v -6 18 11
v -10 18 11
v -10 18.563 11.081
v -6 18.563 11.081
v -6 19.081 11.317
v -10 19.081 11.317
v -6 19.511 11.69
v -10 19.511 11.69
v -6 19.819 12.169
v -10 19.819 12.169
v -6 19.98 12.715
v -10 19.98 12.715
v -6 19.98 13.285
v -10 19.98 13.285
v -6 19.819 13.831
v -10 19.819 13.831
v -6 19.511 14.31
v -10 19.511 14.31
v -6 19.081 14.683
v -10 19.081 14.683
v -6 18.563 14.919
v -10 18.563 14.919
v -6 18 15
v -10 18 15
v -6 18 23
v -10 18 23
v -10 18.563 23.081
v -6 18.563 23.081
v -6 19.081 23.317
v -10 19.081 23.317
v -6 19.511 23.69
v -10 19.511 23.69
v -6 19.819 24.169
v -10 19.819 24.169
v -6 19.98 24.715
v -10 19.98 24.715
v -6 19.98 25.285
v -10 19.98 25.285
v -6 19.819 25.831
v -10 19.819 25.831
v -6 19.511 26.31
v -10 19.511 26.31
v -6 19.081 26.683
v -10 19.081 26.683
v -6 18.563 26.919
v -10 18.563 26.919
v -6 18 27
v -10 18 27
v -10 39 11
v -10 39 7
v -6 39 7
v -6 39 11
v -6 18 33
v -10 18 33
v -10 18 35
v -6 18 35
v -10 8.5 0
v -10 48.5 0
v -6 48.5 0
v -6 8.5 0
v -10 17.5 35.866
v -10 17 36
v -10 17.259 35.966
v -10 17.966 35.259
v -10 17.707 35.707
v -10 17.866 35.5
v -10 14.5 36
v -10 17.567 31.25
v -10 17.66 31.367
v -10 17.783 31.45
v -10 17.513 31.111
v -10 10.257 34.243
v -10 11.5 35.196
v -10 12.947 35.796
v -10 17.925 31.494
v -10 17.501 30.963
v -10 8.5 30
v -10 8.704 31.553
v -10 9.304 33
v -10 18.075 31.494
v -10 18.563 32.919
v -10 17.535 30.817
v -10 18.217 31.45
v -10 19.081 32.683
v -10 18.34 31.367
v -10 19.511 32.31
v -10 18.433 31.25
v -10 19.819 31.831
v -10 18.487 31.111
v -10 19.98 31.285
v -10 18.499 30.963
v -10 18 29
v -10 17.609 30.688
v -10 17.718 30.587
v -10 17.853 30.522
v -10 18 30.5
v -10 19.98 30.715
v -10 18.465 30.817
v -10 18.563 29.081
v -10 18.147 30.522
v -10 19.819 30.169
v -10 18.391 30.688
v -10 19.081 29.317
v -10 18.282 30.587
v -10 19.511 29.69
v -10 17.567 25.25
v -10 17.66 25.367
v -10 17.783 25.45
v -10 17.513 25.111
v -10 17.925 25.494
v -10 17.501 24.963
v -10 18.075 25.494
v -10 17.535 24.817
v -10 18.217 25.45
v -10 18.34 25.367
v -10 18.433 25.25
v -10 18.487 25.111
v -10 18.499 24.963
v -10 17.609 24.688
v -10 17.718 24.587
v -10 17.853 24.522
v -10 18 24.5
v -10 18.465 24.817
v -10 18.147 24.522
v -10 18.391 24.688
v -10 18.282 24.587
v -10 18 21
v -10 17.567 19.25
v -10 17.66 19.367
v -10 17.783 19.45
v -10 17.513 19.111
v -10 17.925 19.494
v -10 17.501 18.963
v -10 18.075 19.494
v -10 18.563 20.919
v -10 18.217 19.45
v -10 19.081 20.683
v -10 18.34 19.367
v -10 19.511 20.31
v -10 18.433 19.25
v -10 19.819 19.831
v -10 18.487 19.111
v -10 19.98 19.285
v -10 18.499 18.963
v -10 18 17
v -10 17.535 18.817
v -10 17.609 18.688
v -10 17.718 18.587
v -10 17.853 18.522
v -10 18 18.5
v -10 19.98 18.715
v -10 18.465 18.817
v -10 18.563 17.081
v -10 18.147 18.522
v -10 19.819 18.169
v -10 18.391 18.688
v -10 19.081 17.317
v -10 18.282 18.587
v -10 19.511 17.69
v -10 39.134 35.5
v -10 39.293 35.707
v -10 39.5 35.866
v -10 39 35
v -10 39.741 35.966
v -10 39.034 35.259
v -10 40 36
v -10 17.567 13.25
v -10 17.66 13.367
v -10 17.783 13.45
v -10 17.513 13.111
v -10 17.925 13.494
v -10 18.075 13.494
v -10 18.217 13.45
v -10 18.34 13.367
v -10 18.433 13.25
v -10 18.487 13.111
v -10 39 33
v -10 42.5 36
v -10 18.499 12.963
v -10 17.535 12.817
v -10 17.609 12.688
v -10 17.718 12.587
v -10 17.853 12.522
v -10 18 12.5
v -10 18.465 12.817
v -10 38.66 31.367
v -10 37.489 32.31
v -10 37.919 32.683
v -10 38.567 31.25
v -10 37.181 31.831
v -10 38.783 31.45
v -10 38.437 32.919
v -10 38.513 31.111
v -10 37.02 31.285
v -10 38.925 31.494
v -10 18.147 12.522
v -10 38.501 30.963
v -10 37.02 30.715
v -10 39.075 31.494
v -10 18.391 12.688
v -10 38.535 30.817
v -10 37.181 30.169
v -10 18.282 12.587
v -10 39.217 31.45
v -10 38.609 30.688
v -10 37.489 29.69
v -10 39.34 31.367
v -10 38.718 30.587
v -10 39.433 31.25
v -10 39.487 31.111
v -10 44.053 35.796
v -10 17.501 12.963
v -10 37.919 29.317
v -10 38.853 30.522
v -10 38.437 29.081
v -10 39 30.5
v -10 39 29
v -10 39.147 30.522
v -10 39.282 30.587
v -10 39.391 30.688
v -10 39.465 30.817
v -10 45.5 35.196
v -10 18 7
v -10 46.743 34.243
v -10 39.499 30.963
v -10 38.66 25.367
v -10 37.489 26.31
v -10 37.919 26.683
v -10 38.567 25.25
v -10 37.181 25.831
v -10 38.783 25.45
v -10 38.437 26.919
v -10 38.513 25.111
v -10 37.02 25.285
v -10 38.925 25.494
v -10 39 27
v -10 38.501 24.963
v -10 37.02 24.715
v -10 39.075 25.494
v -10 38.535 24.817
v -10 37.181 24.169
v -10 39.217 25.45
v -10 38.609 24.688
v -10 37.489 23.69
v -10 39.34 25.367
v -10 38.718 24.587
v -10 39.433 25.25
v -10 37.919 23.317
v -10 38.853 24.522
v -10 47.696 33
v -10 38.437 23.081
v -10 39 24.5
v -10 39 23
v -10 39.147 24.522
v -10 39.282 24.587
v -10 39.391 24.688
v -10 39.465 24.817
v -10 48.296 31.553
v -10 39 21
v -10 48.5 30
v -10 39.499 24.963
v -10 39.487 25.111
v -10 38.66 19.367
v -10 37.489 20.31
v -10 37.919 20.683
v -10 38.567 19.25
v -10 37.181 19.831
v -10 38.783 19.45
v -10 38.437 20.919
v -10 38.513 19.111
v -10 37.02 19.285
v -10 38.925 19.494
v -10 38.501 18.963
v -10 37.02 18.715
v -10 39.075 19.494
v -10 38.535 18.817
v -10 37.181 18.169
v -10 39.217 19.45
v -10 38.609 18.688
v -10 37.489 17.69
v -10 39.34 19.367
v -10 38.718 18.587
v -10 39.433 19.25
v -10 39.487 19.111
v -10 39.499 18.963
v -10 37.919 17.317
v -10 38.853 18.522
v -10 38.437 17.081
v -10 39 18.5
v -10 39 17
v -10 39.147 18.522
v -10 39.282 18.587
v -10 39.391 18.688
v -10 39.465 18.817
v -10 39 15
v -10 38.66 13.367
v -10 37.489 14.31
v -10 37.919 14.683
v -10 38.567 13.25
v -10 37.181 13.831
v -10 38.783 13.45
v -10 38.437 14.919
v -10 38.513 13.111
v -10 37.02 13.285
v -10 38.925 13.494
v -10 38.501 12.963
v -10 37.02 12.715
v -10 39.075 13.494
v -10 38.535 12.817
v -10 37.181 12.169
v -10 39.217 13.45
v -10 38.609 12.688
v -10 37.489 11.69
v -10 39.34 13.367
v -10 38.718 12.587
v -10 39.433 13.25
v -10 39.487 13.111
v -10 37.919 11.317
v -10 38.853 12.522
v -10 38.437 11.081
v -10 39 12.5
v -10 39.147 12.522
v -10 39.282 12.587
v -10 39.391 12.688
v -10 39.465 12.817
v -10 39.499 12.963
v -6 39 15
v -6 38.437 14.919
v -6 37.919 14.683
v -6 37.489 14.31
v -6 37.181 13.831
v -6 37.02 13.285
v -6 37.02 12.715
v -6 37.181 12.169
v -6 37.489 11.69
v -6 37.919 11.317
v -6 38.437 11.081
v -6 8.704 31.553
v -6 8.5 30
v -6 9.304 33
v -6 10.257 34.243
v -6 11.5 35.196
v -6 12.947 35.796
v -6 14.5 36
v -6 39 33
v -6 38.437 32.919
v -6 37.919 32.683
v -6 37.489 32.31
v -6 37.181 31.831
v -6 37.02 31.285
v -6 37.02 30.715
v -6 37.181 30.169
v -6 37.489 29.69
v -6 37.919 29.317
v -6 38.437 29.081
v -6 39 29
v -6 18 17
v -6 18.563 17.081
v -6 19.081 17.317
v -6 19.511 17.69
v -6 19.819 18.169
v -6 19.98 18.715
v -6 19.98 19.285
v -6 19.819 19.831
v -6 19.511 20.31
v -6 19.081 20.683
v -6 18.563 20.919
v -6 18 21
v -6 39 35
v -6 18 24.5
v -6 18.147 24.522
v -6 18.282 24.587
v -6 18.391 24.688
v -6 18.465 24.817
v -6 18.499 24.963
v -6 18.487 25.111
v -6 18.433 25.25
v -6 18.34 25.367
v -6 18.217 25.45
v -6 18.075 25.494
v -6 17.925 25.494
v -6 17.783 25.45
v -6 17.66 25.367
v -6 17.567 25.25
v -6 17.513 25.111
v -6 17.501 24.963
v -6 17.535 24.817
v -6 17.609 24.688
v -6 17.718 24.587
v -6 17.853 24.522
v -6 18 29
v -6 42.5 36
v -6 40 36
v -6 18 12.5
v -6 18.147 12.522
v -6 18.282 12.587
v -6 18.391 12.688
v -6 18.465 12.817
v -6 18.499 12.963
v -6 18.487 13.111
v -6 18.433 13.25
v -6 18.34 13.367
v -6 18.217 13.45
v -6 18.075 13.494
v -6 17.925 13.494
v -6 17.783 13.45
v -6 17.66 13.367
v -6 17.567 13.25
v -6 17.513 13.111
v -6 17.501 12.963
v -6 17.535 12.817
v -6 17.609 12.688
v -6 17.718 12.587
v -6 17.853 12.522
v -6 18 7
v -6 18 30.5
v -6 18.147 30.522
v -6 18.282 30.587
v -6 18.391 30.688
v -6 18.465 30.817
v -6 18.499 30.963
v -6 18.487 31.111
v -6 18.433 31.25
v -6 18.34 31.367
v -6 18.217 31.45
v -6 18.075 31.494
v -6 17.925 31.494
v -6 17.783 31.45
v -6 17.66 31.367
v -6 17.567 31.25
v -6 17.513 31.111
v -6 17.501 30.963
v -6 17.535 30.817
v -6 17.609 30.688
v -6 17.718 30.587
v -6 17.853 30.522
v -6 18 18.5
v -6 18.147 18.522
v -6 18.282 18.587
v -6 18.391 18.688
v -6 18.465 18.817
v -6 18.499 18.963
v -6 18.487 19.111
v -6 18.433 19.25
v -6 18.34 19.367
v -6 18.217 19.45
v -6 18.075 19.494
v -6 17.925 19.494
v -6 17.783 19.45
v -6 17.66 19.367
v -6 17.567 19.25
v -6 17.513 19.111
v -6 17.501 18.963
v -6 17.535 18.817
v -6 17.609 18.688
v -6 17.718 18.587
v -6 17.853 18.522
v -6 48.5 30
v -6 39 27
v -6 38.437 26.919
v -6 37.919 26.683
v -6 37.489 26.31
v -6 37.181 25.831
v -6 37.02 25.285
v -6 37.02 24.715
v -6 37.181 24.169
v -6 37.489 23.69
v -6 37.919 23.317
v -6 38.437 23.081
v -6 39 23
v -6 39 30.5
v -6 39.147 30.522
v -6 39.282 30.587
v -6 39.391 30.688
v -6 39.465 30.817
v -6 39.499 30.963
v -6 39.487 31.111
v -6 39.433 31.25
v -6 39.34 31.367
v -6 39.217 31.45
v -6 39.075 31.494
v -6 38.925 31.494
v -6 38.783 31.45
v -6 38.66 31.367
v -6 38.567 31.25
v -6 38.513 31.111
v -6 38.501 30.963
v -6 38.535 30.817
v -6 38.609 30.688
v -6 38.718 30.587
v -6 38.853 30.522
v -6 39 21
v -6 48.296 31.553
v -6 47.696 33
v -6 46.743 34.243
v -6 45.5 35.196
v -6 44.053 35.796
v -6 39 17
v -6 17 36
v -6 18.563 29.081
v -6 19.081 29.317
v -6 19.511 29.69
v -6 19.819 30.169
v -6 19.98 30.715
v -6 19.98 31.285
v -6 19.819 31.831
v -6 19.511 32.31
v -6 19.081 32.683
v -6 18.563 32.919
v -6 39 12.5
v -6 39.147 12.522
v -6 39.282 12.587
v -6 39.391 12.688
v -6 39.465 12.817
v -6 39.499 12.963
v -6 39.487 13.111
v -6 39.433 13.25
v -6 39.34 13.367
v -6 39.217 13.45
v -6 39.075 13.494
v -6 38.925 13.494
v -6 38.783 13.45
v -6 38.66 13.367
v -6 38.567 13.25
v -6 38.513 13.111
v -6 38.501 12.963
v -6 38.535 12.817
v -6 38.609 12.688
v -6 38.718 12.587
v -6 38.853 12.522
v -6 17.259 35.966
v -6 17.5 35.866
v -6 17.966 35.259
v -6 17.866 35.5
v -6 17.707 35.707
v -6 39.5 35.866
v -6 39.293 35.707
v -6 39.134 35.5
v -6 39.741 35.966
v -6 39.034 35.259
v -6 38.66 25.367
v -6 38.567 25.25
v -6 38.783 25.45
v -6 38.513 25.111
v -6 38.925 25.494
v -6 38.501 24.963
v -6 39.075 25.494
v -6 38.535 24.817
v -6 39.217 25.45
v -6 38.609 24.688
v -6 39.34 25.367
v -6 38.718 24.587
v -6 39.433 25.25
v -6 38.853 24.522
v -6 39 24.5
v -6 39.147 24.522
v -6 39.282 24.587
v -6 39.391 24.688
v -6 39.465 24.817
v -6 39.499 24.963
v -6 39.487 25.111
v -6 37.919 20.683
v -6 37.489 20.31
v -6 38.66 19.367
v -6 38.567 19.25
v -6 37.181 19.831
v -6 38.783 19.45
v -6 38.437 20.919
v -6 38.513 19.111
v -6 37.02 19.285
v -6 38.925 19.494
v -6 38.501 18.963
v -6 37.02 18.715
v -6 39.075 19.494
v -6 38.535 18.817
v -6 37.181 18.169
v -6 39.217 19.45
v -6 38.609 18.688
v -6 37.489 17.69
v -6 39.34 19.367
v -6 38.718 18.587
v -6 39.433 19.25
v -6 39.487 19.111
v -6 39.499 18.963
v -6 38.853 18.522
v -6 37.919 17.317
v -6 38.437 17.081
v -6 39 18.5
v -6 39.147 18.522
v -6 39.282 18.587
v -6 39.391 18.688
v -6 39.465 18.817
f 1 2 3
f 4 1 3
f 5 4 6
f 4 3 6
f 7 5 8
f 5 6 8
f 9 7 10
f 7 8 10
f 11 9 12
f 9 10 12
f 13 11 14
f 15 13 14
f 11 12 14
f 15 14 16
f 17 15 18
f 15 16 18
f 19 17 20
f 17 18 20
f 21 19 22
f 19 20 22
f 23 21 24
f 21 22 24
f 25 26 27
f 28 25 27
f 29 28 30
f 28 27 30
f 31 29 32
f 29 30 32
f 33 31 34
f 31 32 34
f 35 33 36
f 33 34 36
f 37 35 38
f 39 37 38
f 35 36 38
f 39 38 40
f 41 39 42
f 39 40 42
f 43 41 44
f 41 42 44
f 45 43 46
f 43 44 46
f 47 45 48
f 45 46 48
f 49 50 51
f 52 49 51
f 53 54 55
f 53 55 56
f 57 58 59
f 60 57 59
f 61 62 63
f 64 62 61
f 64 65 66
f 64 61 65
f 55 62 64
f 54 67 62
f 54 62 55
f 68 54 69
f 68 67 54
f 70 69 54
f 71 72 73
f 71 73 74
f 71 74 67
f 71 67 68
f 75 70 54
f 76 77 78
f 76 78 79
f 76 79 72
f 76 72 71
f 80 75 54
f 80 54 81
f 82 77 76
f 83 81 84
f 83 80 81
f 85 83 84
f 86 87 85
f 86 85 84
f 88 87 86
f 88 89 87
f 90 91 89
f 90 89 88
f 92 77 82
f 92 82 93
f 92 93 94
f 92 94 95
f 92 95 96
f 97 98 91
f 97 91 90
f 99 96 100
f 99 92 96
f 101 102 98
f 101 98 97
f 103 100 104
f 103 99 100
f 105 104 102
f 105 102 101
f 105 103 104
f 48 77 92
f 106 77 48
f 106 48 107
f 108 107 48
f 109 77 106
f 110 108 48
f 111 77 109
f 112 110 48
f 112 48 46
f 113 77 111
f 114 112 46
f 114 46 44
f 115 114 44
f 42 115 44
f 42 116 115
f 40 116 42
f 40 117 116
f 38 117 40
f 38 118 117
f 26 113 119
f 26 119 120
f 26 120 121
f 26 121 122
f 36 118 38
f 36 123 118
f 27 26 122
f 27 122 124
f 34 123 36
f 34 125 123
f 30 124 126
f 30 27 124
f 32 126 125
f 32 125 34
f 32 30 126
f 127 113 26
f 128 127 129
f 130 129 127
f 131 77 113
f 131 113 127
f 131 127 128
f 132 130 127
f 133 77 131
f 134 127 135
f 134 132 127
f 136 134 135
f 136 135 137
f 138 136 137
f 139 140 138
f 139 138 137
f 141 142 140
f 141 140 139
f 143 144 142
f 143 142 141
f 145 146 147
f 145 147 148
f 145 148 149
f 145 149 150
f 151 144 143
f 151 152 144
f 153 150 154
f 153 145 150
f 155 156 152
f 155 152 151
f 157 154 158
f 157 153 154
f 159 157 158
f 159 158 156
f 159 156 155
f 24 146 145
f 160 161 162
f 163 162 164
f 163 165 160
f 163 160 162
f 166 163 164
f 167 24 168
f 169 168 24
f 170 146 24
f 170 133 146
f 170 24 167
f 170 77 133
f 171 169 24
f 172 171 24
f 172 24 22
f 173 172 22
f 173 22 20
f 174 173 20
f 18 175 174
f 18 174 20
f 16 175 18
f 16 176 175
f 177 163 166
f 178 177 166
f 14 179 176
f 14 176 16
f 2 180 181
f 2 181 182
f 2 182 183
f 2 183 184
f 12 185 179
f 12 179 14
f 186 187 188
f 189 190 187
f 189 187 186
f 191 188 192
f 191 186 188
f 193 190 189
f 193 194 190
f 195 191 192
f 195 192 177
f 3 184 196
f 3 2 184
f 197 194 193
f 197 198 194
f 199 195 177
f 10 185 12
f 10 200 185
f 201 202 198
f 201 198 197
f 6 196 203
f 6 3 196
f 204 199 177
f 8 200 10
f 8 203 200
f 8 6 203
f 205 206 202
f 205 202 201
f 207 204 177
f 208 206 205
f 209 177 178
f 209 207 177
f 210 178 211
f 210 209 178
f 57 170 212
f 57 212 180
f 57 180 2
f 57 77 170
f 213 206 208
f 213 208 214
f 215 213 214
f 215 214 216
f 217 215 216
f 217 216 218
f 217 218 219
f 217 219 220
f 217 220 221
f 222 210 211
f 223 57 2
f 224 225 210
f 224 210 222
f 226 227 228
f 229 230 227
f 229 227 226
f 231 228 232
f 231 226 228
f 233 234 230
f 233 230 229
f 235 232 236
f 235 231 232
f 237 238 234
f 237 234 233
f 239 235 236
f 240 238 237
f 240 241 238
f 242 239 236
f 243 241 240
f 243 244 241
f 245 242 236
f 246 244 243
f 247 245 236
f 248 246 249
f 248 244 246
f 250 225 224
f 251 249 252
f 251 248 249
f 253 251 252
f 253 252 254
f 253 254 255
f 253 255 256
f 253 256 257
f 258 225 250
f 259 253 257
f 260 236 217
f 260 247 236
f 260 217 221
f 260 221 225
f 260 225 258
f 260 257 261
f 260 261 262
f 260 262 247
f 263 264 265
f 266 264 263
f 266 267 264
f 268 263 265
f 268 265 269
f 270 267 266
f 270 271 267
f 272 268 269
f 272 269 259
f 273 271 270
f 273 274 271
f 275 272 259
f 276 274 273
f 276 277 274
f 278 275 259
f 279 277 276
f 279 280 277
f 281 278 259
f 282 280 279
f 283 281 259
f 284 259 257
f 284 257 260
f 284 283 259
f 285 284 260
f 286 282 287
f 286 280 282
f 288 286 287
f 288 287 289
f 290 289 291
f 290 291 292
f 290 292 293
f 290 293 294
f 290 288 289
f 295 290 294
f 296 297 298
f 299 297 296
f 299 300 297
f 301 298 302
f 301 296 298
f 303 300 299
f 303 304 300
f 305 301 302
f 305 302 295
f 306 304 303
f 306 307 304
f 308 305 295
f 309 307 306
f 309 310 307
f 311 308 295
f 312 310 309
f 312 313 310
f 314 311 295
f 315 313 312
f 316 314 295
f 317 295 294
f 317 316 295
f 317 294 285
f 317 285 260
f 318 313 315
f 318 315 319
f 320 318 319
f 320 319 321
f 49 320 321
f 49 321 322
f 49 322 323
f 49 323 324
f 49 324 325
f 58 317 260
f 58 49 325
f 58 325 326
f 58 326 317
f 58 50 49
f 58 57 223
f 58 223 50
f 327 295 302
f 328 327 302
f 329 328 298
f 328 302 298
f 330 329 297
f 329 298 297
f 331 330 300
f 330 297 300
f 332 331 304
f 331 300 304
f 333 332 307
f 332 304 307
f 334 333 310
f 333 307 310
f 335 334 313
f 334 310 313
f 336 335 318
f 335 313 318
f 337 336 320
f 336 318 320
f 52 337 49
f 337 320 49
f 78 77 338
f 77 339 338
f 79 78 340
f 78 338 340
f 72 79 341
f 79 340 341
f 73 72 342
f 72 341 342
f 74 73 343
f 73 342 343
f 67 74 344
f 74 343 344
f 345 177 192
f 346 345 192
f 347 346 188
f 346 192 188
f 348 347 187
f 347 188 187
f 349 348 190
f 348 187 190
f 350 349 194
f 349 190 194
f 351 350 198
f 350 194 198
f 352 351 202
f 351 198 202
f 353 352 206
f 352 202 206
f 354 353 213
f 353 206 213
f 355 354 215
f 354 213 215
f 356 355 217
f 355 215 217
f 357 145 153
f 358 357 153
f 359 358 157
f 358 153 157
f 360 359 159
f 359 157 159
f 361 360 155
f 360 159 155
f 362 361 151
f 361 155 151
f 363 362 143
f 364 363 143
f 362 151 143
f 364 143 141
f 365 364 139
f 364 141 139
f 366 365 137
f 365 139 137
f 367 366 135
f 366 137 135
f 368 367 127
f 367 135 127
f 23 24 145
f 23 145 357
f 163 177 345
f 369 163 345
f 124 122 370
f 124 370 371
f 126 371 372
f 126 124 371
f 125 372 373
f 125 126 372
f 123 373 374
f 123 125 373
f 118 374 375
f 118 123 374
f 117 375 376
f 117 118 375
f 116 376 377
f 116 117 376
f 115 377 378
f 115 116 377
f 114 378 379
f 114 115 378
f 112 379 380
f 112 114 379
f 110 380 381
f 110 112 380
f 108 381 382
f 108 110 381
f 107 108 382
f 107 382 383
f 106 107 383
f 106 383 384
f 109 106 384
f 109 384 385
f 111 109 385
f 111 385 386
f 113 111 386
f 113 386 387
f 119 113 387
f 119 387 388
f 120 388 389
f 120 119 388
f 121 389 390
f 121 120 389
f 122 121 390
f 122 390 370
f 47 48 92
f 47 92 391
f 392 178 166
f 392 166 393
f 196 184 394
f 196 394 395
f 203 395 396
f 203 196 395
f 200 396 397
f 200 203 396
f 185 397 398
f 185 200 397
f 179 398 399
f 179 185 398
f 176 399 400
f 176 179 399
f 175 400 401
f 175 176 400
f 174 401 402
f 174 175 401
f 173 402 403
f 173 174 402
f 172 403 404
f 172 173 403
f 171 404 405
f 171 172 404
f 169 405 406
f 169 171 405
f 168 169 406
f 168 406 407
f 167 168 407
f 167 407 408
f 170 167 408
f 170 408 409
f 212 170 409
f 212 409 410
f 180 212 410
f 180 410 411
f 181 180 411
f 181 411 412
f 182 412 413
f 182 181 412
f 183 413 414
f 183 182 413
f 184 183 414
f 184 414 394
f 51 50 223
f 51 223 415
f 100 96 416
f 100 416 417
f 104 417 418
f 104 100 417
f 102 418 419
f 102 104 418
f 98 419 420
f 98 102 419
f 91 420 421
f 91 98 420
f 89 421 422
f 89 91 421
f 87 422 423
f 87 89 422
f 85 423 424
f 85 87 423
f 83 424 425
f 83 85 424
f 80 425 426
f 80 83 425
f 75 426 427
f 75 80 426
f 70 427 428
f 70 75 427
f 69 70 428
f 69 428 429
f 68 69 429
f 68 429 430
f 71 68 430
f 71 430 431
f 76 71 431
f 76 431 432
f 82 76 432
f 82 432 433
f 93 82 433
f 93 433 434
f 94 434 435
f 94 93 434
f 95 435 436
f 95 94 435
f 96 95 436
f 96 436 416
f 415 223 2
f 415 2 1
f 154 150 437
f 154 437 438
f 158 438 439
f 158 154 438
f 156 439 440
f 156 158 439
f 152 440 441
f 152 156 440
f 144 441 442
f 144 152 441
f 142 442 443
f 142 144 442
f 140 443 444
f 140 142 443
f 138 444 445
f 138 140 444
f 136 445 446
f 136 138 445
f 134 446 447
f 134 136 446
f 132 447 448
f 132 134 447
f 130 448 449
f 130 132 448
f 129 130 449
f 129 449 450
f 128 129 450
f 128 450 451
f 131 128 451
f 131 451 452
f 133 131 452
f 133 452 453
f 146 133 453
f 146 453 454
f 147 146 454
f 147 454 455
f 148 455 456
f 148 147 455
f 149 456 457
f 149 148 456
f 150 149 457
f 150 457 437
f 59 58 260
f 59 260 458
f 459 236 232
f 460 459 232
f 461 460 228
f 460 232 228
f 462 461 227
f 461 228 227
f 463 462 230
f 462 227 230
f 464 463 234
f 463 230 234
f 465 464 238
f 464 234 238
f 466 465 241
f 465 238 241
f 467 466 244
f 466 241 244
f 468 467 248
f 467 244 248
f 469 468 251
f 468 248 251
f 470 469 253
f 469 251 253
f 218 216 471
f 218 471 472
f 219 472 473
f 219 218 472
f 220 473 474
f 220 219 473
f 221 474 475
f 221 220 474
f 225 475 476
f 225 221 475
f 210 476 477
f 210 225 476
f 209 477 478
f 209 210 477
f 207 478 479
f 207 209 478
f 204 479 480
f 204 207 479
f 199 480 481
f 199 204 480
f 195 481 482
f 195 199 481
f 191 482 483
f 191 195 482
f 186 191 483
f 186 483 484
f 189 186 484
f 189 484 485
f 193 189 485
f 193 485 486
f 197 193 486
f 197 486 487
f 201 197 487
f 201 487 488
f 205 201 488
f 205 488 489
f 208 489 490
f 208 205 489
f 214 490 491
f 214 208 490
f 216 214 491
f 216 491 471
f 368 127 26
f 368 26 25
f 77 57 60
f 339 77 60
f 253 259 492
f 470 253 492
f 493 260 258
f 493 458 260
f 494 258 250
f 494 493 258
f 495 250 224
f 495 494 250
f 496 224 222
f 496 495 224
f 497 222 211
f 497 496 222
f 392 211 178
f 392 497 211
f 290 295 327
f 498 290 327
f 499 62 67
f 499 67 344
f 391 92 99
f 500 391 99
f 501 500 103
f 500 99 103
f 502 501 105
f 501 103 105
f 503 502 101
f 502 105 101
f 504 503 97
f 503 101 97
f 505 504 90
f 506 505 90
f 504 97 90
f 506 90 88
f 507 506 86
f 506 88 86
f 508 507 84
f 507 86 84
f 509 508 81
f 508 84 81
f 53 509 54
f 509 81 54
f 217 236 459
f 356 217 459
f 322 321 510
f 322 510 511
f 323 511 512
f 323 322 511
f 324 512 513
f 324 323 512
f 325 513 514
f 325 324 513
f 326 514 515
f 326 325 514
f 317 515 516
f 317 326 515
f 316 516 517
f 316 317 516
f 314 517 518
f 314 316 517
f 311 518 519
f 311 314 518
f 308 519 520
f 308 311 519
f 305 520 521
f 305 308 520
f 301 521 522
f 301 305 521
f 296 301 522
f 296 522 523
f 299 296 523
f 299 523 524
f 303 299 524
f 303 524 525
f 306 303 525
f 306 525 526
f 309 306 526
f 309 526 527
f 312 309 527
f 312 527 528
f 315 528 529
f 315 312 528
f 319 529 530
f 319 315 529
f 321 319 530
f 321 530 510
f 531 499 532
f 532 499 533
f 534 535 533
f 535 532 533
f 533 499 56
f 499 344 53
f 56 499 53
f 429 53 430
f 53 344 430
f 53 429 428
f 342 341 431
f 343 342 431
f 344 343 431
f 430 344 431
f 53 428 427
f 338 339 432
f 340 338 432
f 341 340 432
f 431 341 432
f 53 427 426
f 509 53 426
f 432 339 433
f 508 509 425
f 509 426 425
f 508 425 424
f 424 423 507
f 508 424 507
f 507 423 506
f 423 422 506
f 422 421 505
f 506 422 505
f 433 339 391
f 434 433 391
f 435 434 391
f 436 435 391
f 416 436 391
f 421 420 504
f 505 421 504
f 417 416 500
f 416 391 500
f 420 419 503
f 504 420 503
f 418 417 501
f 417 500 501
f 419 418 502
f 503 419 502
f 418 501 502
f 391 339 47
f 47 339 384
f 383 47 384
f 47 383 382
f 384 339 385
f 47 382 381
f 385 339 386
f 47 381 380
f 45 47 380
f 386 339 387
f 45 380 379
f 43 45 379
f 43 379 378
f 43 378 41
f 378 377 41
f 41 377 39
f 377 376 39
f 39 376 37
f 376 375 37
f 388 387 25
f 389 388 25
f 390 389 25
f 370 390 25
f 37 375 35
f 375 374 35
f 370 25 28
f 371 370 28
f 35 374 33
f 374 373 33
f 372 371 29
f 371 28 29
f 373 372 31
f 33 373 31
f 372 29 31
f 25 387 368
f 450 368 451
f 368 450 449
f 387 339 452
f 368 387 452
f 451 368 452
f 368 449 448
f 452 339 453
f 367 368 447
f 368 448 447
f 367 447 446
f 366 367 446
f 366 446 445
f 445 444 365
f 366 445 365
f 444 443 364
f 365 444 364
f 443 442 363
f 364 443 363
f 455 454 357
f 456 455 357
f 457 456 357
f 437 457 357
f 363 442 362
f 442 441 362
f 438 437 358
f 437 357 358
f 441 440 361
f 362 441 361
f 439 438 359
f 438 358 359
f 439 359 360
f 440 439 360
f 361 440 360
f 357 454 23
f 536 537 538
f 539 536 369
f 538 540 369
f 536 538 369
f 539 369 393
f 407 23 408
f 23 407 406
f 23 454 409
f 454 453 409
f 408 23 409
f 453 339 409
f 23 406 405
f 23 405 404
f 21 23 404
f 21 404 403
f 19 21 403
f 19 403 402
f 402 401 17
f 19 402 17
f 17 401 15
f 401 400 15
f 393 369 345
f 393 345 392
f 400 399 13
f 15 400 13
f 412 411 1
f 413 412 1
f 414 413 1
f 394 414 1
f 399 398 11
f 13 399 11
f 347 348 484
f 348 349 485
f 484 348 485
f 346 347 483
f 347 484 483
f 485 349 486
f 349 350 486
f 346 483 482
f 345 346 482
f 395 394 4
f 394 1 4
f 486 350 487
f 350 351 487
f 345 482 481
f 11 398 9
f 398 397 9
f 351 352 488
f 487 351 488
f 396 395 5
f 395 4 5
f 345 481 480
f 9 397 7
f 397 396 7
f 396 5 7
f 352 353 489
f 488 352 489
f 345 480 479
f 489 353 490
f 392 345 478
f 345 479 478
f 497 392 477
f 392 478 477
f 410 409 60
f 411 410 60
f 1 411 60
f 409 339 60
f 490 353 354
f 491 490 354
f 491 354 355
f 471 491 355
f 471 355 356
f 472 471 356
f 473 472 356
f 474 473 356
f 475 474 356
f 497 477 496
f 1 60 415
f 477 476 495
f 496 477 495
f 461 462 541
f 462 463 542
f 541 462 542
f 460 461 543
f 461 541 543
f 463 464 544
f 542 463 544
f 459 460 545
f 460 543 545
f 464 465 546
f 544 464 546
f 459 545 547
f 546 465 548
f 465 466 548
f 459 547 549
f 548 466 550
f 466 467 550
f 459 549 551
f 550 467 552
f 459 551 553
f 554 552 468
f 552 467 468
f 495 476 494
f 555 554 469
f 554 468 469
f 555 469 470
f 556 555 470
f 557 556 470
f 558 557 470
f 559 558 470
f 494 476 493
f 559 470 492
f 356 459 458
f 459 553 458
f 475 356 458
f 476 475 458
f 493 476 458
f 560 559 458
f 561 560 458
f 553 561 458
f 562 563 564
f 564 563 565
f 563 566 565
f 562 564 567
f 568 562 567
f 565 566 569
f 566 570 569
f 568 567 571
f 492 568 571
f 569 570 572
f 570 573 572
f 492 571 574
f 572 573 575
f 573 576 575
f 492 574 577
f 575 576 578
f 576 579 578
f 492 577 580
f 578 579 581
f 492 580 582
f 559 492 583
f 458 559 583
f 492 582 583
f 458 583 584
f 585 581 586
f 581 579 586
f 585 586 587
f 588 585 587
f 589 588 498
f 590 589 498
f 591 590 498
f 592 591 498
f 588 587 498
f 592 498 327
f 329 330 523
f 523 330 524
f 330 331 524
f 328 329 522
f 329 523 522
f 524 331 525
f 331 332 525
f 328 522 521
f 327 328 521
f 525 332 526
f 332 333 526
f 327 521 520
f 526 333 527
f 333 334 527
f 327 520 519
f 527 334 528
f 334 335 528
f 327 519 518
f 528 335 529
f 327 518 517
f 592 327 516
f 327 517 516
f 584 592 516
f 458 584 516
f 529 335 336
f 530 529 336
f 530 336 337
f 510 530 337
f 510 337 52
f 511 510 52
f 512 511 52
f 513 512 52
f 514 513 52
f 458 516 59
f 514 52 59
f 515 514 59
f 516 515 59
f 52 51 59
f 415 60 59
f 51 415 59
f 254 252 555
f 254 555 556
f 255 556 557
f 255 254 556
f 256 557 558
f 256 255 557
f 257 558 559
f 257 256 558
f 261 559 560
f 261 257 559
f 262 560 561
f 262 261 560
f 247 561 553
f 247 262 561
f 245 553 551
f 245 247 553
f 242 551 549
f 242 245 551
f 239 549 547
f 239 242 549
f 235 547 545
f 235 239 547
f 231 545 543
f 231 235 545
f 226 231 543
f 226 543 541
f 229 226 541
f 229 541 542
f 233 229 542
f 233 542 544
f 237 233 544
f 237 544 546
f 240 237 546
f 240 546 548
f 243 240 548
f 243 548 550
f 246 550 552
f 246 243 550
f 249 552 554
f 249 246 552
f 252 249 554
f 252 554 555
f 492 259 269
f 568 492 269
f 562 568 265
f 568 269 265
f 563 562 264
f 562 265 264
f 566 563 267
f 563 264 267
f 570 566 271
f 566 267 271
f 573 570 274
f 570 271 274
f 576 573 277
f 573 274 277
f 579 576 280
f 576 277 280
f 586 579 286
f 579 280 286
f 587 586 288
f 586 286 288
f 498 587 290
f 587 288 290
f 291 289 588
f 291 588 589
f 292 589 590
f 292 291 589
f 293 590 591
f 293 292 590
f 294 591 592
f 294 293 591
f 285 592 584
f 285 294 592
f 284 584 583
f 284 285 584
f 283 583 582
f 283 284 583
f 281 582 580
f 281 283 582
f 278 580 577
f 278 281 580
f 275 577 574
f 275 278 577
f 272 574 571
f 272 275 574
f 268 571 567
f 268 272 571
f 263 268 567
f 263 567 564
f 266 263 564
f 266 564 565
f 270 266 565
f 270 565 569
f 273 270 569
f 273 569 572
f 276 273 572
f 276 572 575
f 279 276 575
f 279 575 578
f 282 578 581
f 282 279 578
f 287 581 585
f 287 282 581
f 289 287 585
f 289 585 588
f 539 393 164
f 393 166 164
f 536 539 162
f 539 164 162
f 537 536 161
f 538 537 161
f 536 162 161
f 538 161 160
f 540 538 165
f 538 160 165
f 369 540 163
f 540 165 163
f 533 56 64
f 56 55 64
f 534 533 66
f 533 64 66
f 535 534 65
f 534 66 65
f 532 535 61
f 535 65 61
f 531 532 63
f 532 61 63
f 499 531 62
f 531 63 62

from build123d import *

# Parameters (mm, degrees)
CYLINDER001_R     = 0.5
CYLINDER001_DEPTH = 4
ARRAY001_Y_COUNT  = 2
ARRAY001_Y_PITCH  = 21
ARRAY001_Z_COUNT  = 4
ARRAY001_Z_PITCH  = 6
BOX001_W          = 4
BOX001_H          = 21
BOX001_DEPTH      = 74
BOX_W             = 4
BOX_H             = 40
BOX_DEPTH         = 36
FILLET001_R       = 6
FILLET004_R       = 1
CYLINDER_R        = 2
CYLINDER_DEPTH    = 4
ARRAY_Y_COUNT     = 2
ARRAY_Y_PITCH     = 21
ARRAY_Z_COUNT     = 4
ARRAY_Z_PITCH     = 6


with BuildPart() as camera_hole_array:
    # Cylinder001 → Cylinder001 (new body)
    with BuildSketch(Plane(origin=(0, 0, 0), x_dir=(0, 0, -1), z_dir=(1, 0, 0))):
        Circle(CYLINDER001_R)
    extrude(amount=CYLINDER001_DEPTH)

    # Array001 Y: camera hole array ×2


with BuildPart() as camera_hole_array_1:
    add(camera_hole_array.part)
    with Locations(*[(0, i * ARRAY001_Y_PITCH, 0) for i in range(1, ARRAY001_Y_COUNT)]):
        add(camera_hole_array.part)

    # Array001 Z: camera hole array ×4


with BuildPart() as camera_hole_array_2:
    add(camera_hole_array_1.part)
    with Locations(*[(0, 0, i * ARRAY001_Z_PITCH) for i in range(1, ARRAY001_Z_COUNT)]):
        add(camera_hole_array_1.part)


with BuildPart() as camera_hole_array_3:
    # Array001 placement: moved
    add(camera_hole_array_2.part.moved(Location((0, 7, 2))))


with BuildPart() as camera_plate_hole:
    # Box001 → Box001 (new body)
    with BuildSketch(Plane(origin=(0, 7, -4), x_dir=(1, 0, 0), z_dir=(0, 0, 1))):
        with Locations((2, 10.5)):
            Rectangle(BOX001_W, BOX001_H)
    extrude(amount=BOX001_DEPTH)


with BuildPart() as camera_plate_cut_fillet:
    # Box → Box (new body)
    with BuildSketch(Plane(origin=(0, -2.5, -11), x_dir=(1, 0, 0), z_dir=(0, 0, 1))):
        with Locations((2, 20)):
            Rectangle(BOX_W, BOX_H)
    extrude(amount=BOX_DEPTH)

    # Fillet001
    fillet001_edges = [camera_plate_cut_fillet.edges().sort_by_distance(p)[0] for p in [
        (2, -2.5, 25),
        (2, 37.5, 25),
    ]]
    fillet(fillet001_edges, radius=FILLET001_R)

    # Cut001: cut camera plate hole
    add(camera_plate_hole.part, mode=Mode.SUBTRACT)

    # Fillet004
    fillet004_edges = [camera_plate_cut_fillet.edges().sort_by_distance(p)[0] for p in [
        (2, 7, 25),
        (2, 28, 25),
    ]]
    fillet(fillet004_edges, radius=FILLET004_R)


with BuildPart() as camera_holder_cut:
    # Cylinder → Cylinder (new body)
    with BuildSketch(Plane(origin=(0, 0, 0), x_dir=(0, 0, -1), z_dir=(1, 0, 0))):
        Circle(CYLINDER_R)
    extrude(amount=CYLINDER_DEPTH)

    # Array Y: camera holder cut ×2


with BuildPart() as camera_holder_cut_1:
    add(camera_holder_cut.part)
    with Locations(*[(0, i * ARRAY_Y_PITCH, 0) for i in range(1, ARRAY_Y_COUNT)]):
        add(camera_holder_cut.part)

    # Array Z: camera holder cut ×4


with BuildPart() as camera_holder_cut_2:
    add(camera_holder_cut_1.part)
    with Locations(*[(0, 0, i * ARRAY_Z_PITCH) for i in range(1, ARRAY_Z_COUNT)]):
        add(camera_holder_cut_1.part)


with BuildPart() as camera_holder_cut_3:
    # Array placement: moved
    add(camera_holder_cut_2.part.moved(Location((0, 7, 2))))

    # Fusion: union camera plate cut fillet
    add(camera_plate_cut_fillet.part)

    # Cut: cut camera hole array
    add(camera_hole_array_3.part, mode=Mode.SUBTRACT)


with BuildPart() as camera_holder_cut_4:
    # Cut placement: moved
    add(camera_holder_cut_3.part.moved(Location((-10, 11, 11))))


solid = camera_holder_cut_4.part
